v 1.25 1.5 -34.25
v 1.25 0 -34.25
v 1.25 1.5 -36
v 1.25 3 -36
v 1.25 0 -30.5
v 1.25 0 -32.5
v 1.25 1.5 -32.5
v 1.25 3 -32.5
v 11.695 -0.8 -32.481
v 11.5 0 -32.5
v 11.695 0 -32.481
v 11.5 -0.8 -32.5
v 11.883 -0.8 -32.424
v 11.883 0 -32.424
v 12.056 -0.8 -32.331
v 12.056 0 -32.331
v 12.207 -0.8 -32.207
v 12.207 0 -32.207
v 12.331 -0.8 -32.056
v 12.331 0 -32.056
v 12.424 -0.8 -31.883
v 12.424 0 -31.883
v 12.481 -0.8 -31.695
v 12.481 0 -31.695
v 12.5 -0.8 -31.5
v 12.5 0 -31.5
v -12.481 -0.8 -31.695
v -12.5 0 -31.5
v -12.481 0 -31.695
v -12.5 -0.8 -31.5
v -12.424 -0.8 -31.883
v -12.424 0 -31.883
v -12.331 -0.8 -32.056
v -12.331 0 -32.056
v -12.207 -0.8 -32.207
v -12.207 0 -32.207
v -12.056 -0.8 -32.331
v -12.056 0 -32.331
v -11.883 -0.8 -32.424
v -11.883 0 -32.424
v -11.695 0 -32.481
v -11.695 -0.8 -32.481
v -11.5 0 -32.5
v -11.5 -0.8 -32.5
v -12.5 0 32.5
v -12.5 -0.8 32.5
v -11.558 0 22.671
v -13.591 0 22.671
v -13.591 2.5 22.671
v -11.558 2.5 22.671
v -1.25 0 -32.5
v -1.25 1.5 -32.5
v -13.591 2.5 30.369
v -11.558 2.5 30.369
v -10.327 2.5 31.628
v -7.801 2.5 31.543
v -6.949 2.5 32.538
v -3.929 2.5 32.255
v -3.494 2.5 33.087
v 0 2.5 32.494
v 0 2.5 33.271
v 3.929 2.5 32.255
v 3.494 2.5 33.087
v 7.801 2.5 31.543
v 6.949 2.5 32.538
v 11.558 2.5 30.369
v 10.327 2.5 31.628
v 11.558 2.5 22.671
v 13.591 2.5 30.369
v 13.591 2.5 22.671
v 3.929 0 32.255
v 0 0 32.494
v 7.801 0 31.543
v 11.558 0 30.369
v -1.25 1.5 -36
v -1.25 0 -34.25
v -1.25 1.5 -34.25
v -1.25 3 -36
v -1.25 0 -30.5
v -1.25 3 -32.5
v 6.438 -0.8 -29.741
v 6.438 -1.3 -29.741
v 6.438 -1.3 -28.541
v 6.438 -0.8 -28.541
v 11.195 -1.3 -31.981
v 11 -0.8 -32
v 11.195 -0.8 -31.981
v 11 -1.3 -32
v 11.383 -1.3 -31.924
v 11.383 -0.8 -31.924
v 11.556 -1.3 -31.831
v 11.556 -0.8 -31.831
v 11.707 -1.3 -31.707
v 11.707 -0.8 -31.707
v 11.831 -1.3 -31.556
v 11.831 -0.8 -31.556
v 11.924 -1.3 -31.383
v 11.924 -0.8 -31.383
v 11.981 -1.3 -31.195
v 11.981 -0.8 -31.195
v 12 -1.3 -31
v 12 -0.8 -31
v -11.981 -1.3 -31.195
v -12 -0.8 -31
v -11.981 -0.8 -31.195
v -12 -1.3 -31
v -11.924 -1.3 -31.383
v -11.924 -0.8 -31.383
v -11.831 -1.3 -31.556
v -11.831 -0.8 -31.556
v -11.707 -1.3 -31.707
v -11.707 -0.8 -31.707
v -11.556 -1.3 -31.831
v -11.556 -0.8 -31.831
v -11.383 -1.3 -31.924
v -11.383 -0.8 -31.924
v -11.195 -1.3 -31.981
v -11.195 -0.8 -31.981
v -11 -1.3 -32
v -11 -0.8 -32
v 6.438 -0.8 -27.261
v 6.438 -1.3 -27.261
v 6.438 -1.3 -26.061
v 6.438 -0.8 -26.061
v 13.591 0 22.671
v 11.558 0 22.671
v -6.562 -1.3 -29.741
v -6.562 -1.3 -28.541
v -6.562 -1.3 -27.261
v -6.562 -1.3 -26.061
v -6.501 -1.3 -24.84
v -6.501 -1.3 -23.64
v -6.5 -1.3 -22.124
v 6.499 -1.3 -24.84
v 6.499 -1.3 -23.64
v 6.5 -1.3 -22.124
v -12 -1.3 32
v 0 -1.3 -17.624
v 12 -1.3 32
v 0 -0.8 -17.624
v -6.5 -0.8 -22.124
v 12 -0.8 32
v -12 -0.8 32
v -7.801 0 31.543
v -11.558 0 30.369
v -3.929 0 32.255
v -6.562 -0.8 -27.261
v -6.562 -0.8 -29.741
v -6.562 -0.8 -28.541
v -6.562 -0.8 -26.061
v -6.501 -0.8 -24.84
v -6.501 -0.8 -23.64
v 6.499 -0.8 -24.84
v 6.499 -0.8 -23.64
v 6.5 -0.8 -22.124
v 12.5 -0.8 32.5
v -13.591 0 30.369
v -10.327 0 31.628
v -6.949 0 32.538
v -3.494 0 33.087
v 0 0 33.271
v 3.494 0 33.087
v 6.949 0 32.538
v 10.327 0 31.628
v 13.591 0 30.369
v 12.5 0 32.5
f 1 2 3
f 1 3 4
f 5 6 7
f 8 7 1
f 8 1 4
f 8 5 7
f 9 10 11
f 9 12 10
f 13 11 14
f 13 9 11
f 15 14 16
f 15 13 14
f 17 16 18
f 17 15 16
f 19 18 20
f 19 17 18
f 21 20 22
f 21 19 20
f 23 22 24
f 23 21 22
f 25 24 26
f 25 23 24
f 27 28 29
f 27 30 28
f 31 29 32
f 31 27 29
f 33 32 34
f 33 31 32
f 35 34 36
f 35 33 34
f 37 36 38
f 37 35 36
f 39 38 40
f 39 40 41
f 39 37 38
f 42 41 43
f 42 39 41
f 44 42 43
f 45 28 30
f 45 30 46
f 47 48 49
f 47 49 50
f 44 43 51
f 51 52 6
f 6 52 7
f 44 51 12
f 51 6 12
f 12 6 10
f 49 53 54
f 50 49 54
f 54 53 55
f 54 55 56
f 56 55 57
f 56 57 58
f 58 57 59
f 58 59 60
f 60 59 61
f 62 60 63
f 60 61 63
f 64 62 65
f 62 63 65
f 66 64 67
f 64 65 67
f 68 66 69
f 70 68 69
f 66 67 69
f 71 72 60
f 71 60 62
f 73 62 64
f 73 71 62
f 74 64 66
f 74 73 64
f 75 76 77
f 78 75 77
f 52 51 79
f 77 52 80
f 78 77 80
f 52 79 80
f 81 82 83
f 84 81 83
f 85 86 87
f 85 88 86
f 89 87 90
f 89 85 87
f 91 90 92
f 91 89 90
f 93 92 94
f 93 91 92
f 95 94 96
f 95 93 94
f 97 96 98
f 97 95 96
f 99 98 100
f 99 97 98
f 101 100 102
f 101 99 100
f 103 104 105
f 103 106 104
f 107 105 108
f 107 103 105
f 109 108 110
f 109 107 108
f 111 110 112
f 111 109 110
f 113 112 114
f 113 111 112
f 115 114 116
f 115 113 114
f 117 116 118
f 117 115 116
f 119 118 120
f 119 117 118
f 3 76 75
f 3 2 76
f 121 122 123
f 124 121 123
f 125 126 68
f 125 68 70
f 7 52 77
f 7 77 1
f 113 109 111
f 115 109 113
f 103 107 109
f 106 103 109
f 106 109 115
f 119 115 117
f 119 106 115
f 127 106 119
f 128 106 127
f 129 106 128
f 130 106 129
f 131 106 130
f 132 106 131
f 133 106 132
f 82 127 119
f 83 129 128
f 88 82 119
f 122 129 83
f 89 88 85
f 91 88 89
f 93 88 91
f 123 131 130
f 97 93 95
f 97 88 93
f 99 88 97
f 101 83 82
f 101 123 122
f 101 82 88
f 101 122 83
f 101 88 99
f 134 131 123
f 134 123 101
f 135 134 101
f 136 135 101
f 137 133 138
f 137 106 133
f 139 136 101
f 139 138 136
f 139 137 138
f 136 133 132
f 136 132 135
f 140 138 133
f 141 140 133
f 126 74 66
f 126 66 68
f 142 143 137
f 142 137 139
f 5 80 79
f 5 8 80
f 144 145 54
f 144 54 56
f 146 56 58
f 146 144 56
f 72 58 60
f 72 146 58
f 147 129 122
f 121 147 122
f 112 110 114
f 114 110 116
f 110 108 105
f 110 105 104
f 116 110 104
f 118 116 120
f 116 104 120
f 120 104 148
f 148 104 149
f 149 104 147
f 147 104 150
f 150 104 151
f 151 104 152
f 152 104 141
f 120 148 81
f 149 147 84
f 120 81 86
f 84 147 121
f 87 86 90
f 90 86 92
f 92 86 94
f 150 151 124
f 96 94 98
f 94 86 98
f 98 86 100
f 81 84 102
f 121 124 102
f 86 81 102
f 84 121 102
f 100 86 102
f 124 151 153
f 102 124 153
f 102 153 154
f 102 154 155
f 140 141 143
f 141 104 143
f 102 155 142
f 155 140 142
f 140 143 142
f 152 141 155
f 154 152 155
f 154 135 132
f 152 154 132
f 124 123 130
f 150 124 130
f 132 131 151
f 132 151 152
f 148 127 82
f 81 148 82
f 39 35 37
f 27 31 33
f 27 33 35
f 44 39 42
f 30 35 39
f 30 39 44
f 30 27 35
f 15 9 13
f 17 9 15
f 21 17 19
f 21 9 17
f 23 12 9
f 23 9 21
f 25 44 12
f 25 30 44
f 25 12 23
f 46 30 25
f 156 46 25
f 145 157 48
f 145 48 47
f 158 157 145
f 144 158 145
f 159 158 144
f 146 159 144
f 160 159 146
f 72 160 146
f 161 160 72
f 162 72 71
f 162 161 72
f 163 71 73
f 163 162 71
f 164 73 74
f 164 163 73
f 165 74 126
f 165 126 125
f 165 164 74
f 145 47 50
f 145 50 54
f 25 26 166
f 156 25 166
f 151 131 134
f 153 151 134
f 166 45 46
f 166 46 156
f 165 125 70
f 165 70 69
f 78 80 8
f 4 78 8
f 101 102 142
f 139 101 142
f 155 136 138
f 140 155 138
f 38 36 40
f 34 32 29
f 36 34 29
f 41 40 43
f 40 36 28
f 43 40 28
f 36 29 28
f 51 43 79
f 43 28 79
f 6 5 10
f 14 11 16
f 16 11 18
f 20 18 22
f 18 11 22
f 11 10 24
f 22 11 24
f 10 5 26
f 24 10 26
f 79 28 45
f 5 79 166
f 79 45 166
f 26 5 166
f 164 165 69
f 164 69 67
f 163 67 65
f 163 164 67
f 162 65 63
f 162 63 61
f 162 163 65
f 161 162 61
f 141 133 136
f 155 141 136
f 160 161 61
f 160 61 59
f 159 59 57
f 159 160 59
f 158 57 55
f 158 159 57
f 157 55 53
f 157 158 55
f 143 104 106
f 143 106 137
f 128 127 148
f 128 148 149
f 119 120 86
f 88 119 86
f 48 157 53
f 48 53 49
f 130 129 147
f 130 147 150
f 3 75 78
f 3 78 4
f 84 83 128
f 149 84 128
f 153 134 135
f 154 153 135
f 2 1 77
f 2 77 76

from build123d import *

# Parameters (mm, degrees)
F0_W      = 25
F0_H      = 65
F1_DEPTH  = 0.8
F2_W      = 24
F2_H      = 64
F3_DEPTH  = 0.5
F4_R      = 1
F4_2_R    = 1
F5_W      = 6.5
F5_H      = 1.2
F6_DEPTH  = 0.7
F8_DEPTH  = 1.25
F9_W      = 2.5
F9_H      = 1.5
F10_DEPTH = 3.5
F12_DEPTH = 1.25
F14_DEPTH = 2.5


with BuildPart() as f1:
    # F0 (on Front) → F1 (new body)
    with BuildSketch(Plane.XZ):
        Rectangle(F0_W, F0_H)
    extrude(amount=F1_DEPTH)

    # F4
    f4_edges = [f1.edges().sort_by_distance(p)[0] for p in [
        (12.5, -0.4, -32.5),
        (-12.5, -0.4, -32.5),
    ]]
    fillet(f4_edges, radius=F4_R)

    # F7 (on Right) → F8 (join, symmetric)
    with BuildSketch(Plane.YZ):
        Polygon((0, -30.5), (0, -32.5), (3, -32.5), align=None)
    extrude(amount=F8_DEPTH, both=True)

    # F9 (on face) → F10 (join)
    with BuildSketch(Plane(origin=(0, 0, -32.5), x_dir=(1, 0, 0), z_dir=(0, 0, -1))):
        with Locations((0, -2.25)):
            Rectangle(F9_W, F9_H)
    extrude(amount=F10_DEPTH)

    # F11 (on Right) → F12 (join, symmetric)
    with BuildSketch(Plane.YZ):
        Polygon((1.5, -36), (1.5, -34.25), (0, -34.25), align=None)
    extrude(amount=F12_DEPTH, both=True)


with BuildPart() as f3:
    # F2 (on face) → F3 (new body)
    with BuildSketch(Plane.XZ.offset(0.8)):
        Rectangle(F2_W, F2_H)
    extrude(amount=F3_DEPTH)

    # F4#2
    f4_2_edges = [f3.edges().sort_by_distance(p)[0] for p in [
        (12, -1.05, -32),
        (-12, -1.05, -32),
    ]]
    fillet(f4_2_edges, radius=F4_2_R)

    # F5 (on face) → F6 (cut)
    with BuildSketch(Plane.XZ.offset(1.3)):
        Polygon((-6.5, -22.1242941916), (0, -22.1242941916), (6.5, -22.1242941916), (0, -17.6242941916), align=None)
        with Locations((-3.2513196841, -24.2404304445)):
            Rectangle(F5_W, F5_H)
        with Locations((3.2486803159, -24.2404304445)):
            Rectangle(F5_W, F5_H)
        with Locations((3.1881782691, -26.6605243087)):
            Rectangle(F5_W, F5_H)
        with Locations((-3.3118217309, -26.6605243087)):
            Rectangle(F5_W, F5_H)
        with Locations((-3.3118230551, -29.1411206126)):
            Rectangle(F5_W, F5_H)
        with Locations((3.1881769449, -29.1411206126)):
            Rectangle(F5_W, F5_H)
    extrude(amount=-F6_DEPTH, mode=Mode.SUBTRACT)


with BuildPart() as f14:
    # F13 (on Front) → F14 (new body)
    with BuildSketch(Plane.XZ):
        with BuildLine():
            ThreePointArc((-11.557778761, 30.3686572288), (-5.8757523748, 31.957990015), (0, 32.4936546385))
            ThreePointArc((0, 32.4936546385), (5.8757523748, 31.957990015), (11.557778761, 30.3686572288))
            Line((11.557778761, 30.3686572288), (11.557778761, 22.671321407))
            Line((11.557778761, 22.671321407), (13.5913705453, 22.671321407))
            Line((13.5913705453, 22.671321407), (13.5913705453, 30.3686572288))
            ThreePointArc((13.5913705453, 30.3686572288), (6.9489351887, 32.5375628301), (0, 33.2713194085))
            ThreePointArc((0, 33.2713194085), (-6.9489351887, 32.5375628301), (-13.5913705453, 30.3686572288))
            Line((-13.5913705453, 30.3686572288), (-13.5913705453, 22.671321407))
            Line((-13.5913705453, 22.671321407), (-11.557778761, 22.671321407))
            Line((-11.557778761, 22.671321407), (-11.557778761, 30.3686572288))
        make_face()
    extrude(amount=-F14_DEPTH)


solid = Compound([f1.part, f3.part, f14.part])
